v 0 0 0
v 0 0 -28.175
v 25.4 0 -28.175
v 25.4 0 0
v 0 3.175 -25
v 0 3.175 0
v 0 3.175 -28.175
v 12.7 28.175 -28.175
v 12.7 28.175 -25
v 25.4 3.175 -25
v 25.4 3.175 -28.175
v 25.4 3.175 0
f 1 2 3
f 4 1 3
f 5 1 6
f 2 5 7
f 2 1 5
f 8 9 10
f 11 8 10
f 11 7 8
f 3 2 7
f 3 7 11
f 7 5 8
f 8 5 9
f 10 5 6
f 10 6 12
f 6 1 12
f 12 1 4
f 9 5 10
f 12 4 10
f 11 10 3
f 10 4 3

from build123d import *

# Parameters (mm, degrees)
SKETCH2_W               = 25.4
SKETCH2_H               = 28.175
BOSS_EXTRUDE1_DEPTH     = 3.175
SKETCH3_W               = 25.4
SKETCH3_H               = 3.175
BOSS_EXTRUDE2_DEPTH     = 25
CUT_EXTRUDE1_DEPTH      = 26
CUT_EXTRUDE1_DEPTH_BACK = 4.175


with BuildPart() as part:
    # Sketch2 → Boss-Extrude1 (new body)
    with BuildSketch(Plane(origin=(0, 0, 0), x_dir=(1, 0, 0), z_dir=(0, 1, 0))):
        with Locations((12.7, 14.0875)):
            Rectangle(SKETCH2_W, SKETCH2_H)
    extrude(amount=BOSS_EXTRUDE1_DEPTH)

    # Sketch3 → Boss-Extrude2 (add)
    with BuildSketch(Plane(origin=(0, 3.175, 0), x_dir=(1, 0, 0), z_dir=(0, 1, 0))):
        with Locations((12.7, 26.5875)):
            Rectangle(SKETCH3_W, SKETCH3_H)
    extrude(amount=BOSS_EXTRUDE2_DEPTH)

    # Sketch4 → Cut-Extrude1 (cut, two sides)
    with BuildSketch(Plane.XY.offset(-25)) as cut_extrude1_sk:
        Polygon((-36.811931354, -69.289431798), (0, 3.175), (12.7, 28.175), (25.4, 3.175), (62.211931354, -69.289431798), (62.211931354, 93.267784785), (-36.811931354, 93.267784785), align=None)
    extrude(amount=CUT_EXTRUDE1_DEPTH, mode=Mode.SUBTRACT)
    extrude(cut_extrude1_sk.sketch, amount=-CUT_EXTRUDE1_DEPTH_BACK, mode=Mode.SUBTRACT)


solid = part.part
